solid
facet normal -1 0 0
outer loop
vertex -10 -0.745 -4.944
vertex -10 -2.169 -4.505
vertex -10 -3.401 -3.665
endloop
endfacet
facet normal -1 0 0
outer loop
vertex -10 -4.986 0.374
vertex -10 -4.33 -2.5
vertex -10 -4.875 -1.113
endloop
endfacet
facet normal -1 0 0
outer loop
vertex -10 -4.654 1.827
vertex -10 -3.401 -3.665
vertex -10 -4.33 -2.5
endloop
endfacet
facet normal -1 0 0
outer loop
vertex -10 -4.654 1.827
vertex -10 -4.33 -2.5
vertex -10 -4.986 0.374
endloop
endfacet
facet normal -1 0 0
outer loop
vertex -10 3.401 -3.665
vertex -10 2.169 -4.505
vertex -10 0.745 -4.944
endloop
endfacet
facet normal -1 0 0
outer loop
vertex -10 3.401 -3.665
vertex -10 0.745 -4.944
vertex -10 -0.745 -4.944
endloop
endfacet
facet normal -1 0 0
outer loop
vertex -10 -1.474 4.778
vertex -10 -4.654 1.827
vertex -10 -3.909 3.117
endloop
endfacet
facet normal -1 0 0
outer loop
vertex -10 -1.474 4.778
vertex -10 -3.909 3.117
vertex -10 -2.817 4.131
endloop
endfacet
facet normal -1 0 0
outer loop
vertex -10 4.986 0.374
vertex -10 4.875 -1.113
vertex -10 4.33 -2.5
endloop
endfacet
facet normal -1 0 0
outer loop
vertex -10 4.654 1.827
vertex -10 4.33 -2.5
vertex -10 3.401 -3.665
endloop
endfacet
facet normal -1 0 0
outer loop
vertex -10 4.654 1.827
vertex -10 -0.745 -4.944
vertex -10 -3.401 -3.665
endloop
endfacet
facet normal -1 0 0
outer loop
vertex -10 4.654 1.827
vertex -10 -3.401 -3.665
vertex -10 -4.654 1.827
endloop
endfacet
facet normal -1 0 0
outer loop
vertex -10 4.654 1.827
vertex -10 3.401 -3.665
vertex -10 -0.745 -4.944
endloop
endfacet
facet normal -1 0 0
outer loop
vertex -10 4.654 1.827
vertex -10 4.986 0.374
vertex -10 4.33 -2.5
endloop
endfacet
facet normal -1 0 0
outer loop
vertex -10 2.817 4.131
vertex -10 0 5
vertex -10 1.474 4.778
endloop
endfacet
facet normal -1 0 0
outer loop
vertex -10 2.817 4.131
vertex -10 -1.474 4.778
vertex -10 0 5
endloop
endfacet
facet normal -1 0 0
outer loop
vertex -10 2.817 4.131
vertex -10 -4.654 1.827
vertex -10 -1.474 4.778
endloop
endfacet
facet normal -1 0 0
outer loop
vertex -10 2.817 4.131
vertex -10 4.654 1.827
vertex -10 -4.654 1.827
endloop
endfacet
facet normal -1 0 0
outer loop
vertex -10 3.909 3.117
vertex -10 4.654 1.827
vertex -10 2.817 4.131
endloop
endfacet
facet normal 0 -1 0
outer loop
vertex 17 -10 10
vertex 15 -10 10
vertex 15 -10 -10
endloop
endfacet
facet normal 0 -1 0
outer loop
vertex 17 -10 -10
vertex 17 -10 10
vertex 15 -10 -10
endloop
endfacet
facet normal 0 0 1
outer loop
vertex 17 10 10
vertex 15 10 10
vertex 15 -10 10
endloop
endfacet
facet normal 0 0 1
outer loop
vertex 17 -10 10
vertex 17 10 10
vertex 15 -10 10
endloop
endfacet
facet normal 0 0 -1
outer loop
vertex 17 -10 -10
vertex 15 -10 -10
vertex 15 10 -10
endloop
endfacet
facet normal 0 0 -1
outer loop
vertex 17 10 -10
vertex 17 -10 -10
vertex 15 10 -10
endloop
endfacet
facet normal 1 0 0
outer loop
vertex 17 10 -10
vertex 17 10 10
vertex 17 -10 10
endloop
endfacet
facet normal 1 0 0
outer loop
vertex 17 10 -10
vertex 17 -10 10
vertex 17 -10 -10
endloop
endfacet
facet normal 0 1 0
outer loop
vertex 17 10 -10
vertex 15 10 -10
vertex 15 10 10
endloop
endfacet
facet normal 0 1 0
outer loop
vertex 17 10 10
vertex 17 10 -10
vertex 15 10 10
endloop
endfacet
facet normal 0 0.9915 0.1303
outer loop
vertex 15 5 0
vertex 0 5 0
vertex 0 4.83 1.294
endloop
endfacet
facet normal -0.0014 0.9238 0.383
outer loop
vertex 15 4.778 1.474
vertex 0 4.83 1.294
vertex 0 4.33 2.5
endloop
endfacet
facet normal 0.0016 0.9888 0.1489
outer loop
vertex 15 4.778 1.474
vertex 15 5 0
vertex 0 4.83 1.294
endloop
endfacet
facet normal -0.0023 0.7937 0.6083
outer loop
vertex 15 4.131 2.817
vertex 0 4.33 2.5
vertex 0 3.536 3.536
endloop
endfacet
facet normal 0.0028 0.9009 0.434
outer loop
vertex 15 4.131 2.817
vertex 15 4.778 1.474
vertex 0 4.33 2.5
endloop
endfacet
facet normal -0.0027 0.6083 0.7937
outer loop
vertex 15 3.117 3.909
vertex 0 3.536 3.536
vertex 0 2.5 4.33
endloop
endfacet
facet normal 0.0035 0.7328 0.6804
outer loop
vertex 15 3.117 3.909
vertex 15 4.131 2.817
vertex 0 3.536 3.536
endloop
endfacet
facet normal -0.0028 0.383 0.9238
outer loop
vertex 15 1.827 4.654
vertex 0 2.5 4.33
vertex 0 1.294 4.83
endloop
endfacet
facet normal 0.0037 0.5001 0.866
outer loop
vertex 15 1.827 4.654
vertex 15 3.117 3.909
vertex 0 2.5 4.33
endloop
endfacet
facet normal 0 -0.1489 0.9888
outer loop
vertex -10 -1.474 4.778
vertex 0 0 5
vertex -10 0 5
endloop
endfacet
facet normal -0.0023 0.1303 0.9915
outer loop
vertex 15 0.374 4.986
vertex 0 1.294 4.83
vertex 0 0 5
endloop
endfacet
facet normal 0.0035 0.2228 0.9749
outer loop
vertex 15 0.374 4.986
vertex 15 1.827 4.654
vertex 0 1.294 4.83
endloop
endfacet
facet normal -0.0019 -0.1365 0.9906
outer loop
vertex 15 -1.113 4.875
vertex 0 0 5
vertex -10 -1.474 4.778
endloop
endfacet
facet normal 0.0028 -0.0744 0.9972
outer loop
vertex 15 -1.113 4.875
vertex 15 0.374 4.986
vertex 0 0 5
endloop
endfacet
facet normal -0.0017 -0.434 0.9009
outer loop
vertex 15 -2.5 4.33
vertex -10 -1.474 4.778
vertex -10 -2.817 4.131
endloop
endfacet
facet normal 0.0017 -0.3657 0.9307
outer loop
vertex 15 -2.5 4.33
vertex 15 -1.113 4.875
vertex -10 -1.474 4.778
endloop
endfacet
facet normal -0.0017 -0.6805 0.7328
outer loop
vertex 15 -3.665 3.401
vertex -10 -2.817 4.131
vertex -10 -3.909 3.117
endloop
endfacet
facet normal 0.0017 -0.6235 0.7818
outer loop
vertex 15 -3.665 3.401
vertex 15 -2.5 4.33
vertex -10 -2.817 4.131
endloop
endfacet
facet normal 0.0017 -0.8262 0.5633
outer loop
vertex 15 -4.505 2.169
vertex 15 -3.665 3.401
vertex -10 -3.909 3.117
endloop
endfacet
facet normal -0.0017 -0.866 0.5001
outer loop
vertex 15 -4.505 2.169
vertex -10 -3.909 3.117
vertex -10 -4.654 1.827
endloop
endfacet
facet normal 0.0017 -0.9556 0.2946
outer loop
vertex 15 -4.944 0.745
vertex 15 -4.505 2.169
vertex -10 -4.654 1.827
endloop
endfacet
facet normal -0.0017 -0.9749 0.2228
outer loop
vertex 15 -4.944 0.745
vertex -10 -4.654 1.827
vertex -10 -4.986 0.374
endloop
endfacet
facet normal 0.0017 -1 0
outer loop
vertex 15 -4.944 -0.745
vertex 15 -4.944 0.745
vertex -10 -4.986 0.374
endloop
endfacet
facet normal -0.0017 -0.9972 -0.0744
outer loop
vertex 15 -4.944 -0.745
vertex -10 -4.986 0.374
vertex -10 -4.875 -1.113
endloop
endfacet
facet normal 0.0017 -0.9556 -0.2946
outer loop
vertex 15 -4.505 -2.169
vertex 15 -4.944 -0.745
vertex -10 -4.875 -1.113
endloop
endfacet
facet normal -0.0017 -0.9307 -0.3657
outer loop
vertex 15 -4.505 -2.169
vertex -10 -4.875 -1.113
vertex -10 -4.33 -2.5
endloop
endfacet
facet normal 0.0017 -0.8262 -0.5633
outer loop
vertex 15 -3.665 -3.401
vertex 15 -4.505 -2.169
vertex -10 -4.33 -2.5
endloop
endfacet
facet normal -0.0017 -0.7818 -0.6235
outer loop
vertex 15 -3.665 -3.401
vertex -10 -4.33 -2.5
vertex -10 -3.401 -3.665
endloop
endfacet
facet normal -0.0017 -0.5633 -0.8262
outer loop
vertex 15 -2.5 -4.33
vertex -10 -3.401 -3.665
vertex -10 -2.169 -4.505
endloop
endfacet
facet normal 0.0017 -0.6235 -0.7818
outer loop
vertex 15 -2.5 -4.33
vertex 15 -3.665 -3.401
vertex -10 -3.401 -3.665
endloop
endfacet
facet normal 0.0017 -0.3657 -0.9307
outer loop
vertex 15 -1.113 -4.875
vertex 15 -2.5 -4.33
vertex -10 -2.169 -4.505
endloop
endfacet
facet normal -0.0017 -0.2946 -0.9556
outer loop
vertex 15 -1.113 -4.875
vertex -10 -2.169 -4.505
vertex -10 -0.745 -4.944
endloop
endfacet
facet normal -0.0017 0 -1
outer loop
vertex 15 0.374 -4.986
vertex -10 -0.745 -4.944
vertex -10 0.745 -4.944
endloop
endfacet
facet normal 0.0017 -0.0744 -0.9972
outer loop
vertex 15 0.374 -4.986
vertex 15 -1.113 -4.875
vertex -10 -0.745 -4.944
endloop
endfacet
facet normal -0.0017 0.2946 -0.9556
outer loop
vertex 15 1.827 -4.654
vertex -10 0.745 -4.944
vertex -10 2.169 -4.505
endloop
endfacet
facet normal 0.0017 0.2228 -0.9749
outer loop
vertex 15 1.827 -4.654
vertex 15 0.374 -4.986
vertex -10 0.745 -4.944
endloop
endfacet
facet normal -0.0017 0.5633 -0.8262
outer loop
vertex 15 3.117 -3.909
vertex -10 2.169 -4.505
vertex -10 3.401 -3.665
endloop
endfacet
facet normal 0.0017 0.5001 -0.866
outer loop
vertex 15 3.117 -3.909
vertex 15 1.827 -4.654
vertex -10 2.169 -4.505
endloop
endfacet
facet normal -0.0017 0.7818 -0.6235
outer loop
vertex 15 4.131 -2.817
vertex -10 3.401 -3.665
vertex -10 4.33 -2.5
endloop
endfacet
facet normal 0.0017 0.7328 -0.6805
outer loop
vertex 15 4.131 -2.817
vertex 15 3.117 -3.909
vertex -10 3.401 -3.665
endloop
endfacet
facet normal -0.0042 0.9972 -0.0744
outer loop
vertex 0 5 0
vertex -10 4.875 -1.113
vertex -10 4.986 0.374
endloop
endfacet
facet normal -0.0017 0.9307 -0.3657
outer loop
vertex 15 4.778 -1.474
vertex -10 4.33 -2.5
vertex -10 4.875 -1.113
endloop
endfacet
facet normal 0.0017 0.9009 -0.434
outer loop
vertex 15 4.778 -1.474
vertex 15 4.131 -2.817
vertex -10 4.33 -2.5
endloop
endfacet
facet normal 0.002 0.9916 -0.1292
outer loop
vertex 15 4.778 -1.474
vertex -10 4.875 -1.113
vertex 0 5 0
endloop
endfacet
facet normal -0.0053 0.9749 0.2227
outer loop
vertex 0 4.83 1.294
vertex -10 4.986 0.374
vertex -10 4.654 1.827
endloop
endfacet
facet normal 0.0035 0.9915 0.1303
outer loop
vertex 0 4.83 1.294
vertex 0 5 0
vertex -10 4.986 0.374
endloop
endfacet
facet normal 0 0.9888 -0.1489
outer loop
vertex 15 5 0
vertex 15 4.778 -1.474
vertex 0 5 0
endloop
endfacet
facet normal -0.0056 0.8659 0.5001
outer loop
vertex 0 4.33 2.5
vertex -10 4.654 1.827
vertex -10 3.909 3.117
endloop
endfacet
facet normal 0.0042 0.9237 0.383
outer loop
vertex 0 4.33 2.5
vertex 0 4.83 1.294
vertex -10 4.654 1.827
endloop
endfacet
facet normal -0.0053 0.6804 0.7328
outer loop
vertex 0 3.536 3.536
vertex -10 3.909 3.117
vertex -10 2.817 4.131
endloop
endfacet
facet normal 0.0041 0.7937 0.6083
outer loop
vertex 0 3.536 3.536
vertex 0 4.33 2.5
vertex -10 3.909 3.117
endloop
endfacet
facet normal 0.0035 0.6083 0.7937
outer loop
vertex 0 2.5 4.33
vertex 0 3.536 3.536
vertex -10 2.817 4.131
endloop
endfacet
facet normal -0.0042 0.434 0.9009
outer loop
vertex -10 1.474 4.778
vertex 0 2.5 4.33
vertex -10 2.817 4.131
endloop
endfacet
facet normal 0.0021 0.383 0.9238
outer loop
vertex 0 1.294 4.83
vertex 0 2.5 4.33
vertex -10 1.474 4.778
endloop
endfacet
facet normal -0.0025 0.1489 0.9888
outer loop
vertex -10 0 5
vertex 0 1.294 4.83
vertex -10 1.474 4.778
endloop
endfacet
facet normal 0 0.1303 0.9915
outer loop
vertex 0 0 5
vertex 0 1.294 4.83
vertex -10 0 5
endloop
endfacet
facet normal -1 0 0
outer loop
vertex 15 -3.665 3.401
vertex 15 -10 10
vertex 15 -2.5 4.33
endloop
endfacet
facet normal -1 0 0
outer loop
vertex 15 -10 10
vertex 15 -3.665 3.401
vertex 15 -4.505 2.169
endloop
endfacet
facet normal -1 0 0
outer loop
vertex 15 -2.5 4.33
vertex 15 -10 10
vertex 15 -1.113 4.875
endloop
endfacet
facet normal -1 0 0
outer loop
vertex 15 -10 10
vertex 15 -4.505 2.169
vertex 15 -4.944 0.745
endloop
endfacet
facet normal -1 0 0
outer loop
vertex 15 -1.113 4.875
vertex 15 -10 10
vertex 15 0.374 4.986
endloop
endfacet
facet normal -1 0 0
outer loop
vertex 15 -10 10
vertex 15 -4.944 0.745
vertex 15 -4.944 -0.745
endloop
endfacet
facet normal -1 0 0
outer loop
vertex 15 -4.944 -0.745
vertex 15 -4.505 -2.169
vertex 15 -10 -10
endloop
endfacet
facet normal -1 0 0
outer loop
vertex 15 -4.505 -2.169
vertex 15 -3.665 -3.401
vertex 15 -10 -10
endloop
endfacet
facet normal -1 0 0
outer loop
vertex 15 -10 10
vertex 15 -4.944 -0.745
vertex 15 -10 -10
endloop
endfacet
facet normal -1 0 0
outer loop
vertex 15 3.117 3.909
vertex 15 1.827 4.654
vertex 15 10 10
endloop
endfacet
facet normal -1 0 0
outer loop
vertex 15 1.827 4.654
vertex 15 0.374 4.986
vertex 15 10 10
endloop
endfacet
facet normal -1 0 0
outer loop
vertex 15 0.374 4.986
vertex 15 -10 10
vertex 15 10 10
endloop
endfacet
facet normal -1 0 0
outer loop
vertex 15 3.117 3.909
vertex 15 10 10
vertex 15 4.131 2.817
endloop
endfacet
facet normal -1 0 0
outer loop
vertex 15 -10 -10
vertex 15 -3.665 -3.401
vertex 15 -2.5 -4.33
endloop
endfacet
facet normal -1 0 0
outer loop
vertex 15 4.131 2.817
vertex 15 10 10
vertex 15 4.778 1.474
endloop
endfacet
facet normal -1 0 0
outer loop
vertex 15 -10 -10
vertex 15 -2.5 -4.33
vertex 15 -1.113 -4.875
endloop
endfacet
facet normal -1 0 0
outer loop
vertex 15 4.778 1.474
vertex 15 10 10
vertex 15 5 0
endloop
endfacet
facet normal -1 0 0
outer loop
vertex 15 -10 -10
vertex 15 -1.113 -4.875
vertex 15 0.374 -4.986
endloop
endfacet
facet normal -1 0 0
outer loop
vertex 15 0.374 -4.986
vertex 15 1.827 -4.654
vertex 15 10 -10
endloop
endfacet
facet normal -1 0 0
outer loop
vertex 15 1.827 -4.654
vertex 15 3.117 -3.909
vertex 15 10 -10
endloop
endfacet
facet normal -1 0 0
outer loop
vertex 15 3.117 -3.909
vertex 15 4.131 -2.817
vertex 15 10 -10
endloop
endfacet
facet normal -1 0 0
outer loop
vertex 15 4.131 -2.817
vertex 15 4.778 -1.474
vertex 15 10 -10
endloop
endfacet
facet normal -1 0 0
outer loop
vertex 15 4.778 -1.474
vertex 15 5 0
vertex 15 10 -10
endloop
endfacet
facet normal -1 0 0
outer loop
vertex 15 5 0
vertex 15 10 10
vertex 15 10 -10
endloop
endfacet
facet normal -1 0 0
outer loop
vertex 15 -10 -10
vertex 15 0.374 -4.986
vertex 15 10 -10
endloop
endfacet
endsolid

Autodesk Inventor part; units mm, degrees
ref_plane "YZ Plane" through (0, 0, 0) normal (1, 0, 0) x (0, 1, 0)
ref_plane "XZ Plane" through (0, 0, 0) normal (0, 1, 0) x (-1, 0, 0)
ref_plane "XY Plane" through (0, 0, 0) normal (0, 0, 1) x (1, 0, 0)
sketch "草图1" plane through (0, 0, 0) normal (1, 0, 0) x (0, 1, 0)
  circle A0 centre (0, 0) radius 5
  dimension "d0" = 10
extrude "拉伸1" add sketch "草图1" along normal blind 15
sketch "草图2" plane through (15, 0, 0) normal (1, 0, 0) x (0, 0, -1)
  line L0 (10, 10) -> (-10, 10)
  line L1 (-10, 10) -> (-10, -10)
  line L2 (-10, -10) -> (10, -10)
  line L3 (10, -10) -> (10, 10)
  point P0 (0, 0)
  dimension "d3" = 20
  dimension "d4" = 20
extrude "拉伸2" add sketch "草图2" along normal blind 2
sketch "草图3" plane through (0, 0, 0) normal (-1, 0, 0) x (0, 0, 1)
  circle A0 centre (0, 0) radius 5
extrude "拉伸3" add sketch "草图3" along normal blind 10
properties part number "激光传感器"
